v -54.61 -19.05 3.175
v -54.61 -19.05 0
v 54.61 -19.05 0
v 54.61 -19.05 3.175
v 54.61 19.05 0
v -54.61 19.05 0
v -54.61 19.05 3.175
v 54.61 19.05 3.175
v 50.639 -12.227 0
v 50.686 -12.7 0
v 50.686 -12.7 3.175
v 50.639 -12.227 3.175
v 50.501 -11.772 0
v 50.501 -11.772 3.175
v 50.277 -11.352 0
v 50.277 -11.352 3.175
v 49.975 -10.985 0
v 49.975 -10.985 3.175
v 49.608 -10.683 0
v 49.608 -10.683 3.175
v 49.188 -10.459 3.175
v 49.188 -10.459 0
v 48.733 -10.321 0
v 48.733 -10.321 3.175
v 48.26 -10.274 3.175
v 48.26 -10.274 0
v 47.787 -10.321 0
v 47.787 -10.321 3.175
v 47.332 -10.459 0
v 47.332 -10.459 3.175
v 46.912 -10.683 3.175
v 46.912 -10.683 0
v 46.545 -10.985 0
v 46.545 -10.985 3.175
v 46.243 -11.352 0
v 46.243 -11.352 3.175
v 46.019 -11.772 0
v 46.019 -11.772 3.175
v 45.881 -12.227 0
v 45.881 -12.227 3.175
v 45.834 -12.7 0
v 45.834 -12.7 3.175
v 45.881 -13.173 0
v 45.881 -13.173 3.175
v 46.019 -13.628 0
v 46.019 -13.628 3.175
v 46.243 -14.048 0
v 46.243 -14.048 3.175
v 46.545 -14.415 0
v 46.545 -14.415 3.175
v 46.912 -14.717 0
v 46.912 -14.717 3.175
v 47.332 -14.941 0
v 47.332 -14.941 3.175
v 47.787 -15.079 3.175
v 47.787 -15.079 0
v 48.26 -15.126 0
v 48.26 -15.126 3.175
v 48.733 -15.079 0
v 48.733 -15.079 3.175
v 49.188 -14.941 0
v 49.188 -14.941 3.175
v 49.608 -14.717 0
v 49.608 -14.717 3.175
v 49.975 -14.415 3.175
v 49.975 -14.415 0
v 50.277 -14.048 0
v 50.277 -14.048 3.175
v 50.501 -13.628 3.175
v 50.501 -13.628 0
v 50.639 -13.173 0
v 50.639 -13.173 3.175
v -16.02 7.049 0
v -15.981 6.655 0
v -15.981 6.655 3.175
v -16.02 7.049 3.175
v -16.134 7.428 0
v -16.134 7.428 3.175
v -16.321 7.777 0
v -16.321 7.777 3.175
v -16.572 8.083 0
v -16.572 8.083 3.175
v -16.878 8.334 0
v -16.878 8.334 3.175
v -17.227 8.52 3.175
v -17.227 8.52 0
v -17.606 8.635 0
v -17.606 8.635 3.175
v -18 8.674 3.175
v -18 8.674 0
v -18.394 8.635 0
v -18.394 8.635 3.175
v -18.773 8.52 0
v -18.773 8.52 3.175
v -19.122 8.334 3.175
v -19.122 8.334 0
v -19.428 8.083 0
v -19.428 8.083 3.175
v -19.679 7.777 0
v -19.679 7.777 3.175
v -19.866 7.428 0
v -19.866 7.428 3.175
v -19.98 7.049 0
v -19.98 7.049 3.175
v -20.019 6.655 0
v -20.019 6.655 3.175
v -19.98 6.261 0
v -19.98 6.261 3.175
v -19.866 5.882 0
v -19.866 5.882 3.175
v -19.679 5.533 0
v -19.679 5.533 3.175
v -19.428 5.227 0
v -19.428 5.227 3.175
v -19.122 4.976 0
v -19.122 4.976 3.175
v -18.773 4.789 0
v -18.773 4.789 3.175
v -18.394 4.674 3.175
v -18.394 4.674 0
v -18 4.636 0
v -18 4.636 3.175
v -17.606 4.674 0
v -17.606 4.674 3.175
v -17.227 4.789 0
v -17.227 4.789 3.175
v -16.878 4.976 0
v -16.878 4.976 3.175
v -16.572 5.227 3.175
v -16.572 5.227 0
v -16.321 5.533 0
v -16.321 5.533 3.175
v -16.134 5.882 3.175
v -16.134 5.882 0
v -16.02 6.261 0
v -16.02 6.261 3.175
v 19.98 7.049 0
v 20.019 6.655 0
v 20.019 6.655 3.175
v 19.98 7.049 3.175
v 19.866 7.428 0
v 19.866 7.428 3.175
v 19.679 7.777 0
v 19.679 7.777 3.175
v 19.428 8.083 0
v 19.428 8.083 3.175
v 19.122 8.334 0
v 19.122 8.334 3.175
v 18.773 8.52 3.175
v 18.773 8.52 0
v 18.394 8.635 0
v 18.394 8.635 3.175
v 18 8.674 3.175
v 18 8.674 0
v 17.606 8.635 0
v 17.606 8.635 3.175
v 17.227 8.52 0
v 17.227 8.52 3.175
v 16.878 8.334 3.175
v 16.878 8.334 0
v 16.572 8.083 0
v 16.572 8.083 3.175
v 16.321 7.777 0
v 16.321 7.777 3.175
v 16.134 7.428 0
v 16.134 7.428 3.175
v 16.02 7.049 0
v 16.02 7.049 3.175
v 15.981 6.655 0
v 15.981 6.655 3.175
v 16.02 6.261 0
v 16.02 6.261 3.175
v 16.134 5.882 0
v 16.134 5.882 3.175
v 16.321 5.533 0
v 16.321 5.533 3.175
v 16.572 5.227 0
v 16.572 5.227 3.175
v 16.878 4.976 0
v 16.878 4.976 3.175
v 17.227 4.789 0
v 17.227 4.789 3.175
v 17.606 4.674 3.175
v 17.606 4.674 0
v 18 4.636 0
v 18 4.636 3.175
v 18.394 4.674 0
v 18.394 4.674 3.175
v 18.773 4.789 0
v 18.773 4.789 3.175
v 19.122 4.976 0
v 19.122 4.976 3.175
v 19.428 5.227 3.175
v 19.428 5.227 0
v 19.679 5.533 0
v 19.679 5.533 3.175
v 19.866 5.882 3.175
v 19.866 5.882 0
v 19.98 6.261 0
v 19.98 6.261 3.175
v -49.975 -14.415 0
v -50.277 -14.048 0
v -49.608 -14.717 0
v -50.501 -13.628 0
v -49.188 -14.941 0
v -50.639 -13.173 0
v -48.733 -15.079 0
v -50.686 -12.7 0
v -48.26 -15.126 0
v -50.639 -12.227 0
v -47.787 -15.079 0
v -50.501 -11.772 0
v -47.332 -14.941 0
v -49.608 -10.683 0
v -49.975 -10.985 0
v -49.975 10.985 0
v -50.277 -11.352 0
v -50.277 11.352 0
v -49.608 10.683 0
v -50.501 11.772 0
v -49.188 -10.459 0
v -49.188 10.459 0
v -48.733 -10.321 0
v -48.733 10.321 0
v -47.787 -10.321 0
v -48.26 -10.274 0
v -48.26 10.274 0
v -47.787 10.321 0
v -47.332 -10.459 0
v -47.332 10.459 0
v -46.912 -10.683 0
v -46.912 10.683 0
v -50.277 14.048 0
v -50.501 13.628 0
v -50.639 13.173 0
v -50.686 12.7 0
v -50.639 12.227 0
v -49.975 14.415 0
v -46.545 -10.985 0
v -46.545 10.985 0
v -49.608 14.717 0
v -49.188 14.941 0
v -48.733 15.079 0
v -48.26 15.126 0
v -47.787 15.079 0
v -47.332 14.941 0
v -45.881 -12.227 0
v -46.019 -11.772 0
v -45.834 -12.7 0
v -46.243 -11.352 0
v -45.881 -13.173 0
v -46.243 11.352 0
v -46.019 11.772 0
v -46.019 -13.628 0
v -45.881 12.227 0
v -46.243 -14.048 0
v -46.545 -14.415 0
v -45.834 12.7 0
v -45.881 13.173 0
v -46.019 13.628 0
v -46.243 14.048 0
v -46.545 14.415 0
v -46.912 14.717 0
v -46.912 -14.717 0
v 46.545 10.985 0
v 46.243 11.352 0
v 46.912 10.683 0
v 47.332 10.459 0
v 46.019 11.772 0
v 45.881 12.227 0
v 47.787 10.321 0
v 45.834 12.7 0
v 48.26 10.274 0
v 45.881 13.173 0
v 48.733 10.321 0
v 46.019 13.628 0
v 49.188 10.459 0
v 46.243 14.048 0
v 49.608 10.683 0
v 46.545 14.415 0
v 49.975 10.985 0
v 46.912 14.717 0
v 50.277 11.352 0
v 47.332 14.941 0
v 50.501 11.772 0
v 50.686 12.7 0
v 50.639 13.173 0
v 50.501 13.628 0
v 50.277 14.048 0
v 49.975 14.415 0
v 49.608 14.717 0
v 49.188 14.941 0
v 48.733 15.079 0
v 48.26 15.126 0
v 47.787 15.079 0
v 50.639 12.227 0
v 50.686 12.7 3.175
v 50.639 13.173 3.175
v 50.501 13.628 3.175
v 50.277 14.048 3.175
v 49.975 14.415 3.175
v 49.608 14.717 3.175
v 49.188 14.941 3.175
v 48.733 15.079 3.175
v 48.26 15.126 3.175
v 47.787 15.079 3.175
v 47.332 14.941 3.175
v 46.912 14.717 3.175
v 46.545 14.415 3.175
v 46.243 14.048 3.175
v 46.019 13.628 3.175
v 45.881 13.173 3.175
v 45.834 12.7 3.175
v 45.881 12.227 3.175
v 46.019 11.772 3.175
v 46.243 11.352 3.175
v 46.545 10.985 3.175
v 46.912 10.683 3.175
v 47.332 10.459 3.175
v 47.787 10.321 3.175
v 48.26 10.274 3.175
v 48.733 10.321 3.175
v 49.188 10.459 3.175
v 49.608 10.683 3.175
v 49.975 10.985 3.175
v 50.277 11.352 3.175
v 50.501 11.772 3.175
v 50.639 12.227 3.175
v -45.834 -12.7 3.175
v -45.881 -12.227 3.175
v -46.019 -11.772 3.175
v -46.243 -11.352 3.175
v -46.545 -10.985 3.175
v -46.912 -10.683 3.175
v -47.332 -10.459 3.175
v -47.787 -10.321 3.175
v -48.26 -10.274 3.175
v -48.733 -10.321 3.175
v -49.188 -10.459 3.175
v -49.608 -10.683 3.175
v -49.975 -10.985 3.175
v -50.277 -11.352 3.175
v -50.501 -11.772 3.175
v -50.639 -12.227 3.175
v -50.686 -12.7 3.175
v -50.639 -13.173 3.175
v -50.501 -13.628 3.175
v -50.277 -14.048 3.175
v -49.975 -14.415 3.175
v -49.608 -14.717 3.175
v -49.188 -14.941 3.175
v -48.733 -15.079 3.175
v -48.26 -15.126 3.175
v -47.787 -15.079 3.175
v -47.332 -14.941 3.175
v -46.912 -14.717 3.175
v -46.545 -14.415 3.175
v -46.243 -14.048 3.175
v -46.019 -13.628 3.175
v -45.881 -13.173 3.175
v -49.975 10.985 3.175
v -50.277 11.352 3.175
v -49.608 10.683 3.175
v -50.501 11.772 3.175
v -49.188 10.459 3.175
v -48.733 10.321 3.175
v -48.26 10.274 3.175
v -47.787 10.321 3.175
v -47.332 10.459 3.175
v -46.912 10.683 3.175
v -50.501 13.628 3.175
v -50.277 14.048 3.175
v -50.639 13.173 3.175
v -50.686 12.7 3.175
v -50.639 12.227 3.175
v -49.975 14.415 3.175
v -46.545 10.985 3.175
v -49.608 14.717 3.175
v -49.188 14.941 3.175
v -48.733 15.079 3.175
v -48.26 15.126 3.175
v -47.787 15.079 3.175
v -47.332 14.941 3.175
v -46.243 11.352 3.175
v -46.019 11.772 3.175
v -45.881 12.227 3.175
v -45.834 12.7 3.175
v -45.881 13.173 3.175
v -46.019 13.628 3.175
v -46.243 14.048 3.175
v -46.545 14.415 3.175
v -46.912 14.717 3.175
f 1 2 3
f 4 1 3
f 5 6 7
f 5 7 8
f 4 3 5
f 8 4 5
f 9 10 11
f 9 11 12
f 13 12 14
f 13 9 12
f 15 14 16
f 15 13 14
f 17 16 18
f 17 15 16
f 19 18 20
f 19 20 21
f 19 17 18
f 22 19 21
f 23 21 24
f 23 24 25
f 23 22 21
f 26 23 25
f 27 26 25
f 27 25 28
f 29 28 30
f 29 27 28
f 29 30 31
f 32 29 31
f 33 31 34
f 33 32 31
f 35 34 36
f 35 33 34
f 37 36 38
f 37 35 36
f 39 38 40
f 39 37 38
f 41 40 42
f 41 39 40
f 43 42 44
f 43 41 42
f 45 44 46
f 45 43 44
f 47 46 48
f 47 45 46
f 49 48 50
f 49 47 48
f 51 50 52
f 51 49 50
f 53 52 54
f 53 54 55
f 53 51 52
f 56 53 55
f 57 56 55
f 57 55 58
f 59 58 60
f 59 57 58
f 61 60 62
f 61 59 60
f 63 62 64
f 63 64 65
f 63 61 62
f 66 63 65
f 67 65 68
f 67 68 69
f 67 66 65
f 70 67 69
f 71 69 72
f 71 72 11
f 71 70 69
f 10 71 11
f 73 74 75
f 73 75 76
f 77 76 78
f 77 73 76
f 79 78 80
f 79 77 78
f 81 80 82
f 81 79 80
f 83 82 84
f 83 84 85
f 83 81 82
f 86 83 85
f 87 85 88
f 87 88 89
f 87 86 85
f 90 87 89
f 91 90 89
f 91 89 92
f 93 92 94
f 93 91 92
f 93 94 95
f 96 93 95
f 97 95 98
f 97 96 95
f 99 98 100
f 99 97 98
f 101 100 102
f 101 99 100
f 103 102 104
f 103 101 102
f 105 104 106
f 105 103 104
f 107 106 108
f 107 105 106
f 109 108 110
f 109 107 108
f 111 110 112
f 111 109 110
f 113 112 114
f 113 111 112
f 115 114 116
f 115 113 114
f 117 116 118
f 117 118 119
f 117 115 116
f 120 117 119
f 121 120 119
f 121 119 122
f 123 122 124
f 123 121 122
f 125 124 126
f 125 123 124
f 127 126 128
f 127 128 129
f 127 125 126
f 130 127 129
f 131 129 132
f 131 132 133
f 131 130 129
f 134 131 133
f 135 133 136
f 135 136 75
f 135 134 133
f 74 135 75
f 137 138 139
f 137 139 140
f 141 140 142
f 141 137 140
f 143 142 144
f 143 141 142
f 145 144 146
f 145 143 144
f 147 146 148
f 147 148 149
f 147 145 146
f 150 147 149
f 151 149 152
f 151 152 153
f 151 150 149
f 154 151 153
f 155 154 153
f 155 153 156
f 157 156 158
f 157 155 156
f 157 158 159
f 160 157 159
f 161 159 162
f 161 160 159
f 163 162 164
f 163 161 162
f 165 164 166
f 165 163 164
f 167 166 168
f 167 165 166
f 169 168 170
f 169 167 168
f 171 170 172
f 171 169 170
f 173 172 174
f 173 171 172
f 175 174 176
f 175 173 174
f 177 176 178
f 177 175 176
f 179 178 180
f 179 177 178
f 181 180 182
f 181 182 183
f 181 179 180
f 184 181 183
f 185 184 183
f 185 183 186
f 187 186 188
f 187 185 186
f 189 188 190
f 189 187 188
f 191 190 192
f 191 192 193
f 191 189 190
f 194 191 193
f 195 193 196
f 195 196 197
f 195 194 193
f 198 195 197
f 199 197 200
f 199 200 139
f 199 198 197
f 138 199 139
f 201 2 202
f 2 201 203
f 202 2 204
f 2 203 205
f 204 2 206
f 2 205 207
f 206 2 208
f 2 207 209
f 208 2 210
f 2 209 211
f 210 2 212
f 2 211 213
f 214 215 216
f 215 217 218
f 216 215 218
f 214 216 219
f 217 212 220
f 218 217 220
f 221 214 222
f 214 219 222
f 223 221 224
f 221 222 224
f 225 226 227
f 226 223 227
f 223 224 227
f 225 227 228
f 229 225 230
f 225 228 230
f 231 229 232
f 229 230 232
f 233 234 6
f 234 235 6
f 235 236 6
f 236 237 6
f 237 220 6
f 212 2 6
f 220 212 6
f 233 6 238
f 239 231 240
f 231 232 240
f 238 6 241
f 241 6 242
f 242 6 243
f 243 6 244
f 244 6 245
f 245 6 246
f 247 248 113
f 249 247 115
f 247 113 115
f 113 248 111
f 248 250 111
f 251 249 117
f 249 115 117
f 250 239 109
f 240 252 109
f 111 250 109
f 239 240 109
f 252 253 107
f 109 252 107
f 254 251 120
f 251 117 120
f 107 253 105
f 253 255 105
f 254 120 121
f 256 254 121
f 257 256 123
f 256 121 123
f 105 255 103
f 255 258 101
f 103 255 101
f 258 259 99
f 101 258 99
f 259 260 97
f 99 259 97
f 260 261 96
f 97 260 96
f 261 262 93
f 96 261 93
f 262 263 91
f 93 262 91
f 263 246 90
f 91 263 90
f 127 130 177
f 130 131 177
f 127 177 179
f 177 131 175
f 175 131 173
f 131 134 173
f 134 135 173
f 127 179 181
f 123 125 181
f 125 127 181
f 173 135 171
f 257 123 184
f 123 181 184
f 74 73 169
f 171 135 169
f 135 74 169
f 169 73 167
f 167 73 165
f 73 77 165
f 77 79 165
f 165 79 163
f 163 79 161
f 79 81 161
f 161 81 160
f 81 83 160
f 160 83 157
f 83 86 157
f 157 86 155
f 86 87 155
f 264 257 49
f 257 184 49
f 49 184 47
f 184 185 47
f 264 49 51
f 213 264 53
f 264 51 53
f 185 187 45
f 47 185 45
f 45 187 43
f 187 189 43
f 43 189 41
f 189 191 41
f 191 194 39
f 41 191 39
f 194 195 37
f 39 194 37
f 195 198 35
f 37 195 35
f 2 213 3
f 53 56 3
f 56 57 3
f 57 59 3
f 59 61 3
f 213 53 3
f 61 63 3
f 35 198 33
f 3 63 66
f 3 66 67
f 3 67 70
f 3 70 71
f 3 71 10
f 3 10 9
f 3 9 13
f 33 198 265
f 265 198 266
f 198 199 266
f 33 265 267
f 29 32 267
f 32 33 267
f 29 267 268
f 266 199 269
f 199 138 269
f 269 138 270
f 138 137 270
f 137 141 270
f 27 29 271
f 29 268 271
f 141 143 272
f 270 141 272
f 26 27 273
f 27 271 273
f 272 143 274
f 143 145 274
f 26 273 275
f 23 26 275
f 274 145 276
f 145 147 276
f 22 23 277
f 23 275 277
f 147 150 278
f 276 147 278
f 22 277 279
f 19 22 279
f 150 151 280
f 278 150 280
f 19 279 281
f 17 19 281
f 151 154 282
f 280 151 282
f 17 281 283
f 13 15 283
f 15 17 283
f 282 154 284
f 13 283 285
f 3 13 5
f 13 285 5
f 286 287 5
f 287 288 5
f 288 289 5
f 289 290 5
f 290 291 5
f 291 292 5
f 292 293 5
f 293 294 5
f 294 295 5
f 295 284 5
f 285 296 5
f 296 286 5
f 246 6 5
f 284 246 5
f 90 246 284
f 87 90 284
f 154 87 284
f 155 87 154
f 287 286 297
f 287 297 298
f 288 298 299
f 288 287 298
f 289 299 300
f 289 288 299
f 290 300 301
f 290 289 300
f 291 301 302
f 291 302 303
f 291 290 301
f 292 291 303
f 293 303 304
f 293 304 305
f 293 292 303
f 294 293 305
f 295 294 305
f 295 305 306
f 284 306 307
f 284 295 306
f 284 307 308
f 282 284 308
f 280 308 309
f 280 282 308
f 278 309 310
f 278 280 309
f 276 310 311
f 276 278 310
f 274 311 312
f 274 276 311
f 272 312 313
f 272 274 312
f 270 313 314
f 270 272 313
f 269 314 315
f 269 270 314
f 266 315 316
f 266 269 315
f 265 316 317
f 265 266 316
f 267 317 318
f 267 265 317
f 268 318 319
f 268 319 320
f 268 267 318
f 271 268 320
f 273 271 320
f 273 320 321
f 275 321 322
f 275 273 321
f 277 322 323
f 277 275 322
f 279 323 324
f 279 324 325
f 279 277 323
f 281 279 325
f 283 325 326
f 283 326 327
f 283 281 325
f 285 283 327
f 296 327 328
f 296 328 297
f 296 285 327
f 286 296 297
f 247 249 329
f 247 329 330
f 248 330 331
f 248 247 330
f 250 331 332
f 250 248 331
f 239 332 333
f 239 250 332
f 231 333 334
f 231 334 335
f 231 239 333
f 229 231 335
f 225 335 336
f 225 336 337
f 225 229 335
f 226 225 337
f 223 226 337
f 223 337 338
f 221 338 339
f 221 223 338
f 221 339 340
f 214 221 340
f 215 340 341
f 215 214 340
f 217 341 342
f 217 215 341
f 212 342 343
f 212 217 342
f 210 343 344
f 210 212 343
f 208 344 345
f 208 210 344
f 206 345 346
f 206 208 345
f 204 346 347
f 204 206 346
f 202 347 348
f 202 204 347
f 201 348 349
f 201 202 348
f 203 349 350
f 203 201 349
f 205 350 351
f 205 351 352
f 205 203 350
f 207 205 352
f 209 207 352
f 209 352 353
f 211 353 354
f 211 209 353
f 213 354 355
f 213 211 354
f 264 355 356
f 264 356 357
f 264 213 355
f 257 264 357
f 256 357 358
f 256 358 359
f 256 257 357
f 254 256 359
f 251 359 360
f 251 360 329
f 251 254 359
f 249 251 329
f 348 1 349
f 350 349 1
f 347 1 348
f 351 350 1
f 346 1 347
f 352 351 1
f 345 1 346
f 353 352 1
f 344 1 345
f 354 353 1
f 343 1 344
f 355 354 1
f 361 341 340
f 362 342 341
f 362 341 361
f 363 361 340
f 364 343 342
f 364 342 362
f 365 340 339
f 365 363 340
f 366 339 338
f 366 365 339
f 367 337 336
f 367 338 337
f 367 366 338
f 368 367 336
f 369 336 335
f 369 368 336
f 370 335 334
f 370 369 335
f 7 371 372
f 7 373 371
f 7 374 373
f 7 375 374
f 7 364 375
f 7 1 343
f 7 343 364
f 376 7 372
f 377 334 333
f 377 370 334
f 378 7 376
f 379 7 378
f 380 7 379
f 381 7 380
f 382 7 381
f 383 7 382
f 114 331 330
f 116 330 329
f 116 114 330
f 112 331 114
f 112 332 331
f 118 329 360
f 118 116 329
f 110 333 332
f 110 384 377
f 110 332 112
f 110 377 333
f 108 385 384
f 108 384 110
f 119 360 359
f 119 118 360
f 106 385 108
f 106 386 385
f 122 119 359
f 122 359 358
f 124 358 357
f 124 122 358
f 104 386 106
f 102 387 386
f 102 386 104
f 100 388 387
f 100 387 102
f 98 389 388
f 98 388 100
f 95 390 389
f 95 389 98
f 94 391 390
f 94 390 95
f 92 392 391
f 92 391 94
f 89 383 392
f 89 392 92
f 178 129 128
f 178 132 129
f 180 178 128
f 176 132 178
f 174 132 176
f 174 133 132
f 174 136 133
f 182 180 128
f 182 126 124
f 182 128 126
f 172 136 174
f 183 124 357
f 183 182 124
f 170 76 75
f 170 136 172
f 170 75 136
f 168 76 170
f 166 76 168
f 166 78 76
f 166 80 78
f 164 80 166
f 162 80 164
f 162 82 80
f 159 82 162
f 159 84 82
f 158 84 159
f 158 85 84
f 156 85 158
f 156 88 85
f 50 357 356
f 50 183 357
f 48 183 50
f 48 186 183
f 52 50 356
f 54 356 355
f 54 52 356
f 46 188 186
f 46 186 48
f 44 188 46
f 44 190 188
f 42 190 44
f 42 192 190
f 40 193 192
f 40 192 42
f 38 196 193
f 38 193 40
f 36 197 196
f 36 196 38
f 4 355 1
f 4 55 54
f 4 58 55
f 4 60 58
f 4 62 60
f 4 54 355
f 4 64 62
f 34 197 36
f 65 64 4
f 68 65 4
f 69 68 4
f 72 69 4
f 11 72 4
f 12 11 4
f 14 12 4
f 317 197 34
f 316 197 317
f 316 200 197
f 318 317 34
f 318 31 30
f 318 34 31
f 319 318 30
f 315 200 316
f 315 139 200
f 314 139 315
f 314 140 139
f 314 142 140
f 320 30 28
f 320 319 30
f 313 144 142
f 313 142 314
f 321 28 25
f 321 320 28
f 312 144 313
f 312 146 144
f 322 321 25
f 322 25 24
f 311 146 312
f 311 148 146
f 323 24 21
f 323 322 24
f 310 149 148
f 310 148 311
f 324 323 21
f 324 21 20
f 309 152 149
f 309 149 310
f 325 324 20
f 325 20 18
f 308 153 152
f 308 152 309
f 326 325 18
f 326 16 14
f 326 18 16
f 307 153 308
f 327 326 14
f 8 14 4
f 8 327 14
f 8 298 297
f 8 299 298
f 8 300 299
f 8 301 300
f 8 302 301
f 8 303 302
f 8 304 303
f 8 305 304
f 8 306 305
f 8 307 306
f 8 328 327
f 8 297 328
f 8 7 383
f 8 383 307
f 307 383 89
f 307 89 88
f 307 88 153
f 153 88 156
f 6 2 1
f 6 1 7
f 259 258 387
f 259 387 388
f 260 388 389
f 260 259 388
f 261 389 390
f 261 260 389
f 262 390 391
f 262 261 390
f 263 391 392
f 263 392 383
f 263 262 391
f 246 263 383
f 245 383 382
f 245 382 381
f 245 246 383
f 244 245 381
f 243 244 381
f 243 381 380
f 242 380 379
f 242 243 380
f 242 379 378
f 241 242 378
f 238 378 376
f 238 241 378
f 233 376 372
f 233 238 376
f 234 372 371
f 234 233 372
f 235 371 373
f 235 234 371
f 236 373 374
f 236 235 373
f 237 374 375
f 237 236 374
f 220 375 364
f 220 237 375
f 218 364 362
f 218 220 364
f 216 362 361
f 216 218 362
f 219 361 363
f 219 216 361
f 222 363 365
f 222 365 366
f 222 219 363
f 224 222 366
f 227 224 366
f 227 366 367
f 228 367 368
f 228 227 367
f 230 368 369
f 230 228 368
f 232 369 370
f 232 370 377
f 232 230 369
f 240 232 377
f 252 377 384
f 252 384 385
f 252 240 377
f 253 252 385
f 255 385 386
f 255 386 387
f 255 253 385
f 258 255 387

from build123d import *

# Parameters (mm, degrees)
F0_W     = 109.22
F0_H     = 38.1
F0_R     = 2.4257
F0_R_2   = 2.0193
F1_DEPTH = 3.175


with BuildPart() as f1:
    # F0 (on Top) → F1 (new body)
    with BuildSketch(Plane.XY):
        Rectangle(F0_W, F0_H)
        with Locations((-48.26, -12.7)):
            Circle(F0_R, mode=Mode.SUBTRACT)
        with Locations((48.26, -12.7)):
            Circle(F0_R, mode=Mode.SUBTRACT)
        with Locations((-18, 6.6548)):
            Circle(F0_R_2, mode=Mode.SUBTRACT)
        with Locations((-48.26, 12.7)):
            Circle(F0_R, mode=Mode.SUBTRACT)
        with Locations((18, 6.6548)):
            Circle(F0_R_2, mode=Mode.SUBTRACT)
        with Locations((48.26, 12.7)):
            Circle(F0_R, mode=Mode.SUBTRACT)
    extrude(amount=F1_DEPTH)


solid = f1.part
